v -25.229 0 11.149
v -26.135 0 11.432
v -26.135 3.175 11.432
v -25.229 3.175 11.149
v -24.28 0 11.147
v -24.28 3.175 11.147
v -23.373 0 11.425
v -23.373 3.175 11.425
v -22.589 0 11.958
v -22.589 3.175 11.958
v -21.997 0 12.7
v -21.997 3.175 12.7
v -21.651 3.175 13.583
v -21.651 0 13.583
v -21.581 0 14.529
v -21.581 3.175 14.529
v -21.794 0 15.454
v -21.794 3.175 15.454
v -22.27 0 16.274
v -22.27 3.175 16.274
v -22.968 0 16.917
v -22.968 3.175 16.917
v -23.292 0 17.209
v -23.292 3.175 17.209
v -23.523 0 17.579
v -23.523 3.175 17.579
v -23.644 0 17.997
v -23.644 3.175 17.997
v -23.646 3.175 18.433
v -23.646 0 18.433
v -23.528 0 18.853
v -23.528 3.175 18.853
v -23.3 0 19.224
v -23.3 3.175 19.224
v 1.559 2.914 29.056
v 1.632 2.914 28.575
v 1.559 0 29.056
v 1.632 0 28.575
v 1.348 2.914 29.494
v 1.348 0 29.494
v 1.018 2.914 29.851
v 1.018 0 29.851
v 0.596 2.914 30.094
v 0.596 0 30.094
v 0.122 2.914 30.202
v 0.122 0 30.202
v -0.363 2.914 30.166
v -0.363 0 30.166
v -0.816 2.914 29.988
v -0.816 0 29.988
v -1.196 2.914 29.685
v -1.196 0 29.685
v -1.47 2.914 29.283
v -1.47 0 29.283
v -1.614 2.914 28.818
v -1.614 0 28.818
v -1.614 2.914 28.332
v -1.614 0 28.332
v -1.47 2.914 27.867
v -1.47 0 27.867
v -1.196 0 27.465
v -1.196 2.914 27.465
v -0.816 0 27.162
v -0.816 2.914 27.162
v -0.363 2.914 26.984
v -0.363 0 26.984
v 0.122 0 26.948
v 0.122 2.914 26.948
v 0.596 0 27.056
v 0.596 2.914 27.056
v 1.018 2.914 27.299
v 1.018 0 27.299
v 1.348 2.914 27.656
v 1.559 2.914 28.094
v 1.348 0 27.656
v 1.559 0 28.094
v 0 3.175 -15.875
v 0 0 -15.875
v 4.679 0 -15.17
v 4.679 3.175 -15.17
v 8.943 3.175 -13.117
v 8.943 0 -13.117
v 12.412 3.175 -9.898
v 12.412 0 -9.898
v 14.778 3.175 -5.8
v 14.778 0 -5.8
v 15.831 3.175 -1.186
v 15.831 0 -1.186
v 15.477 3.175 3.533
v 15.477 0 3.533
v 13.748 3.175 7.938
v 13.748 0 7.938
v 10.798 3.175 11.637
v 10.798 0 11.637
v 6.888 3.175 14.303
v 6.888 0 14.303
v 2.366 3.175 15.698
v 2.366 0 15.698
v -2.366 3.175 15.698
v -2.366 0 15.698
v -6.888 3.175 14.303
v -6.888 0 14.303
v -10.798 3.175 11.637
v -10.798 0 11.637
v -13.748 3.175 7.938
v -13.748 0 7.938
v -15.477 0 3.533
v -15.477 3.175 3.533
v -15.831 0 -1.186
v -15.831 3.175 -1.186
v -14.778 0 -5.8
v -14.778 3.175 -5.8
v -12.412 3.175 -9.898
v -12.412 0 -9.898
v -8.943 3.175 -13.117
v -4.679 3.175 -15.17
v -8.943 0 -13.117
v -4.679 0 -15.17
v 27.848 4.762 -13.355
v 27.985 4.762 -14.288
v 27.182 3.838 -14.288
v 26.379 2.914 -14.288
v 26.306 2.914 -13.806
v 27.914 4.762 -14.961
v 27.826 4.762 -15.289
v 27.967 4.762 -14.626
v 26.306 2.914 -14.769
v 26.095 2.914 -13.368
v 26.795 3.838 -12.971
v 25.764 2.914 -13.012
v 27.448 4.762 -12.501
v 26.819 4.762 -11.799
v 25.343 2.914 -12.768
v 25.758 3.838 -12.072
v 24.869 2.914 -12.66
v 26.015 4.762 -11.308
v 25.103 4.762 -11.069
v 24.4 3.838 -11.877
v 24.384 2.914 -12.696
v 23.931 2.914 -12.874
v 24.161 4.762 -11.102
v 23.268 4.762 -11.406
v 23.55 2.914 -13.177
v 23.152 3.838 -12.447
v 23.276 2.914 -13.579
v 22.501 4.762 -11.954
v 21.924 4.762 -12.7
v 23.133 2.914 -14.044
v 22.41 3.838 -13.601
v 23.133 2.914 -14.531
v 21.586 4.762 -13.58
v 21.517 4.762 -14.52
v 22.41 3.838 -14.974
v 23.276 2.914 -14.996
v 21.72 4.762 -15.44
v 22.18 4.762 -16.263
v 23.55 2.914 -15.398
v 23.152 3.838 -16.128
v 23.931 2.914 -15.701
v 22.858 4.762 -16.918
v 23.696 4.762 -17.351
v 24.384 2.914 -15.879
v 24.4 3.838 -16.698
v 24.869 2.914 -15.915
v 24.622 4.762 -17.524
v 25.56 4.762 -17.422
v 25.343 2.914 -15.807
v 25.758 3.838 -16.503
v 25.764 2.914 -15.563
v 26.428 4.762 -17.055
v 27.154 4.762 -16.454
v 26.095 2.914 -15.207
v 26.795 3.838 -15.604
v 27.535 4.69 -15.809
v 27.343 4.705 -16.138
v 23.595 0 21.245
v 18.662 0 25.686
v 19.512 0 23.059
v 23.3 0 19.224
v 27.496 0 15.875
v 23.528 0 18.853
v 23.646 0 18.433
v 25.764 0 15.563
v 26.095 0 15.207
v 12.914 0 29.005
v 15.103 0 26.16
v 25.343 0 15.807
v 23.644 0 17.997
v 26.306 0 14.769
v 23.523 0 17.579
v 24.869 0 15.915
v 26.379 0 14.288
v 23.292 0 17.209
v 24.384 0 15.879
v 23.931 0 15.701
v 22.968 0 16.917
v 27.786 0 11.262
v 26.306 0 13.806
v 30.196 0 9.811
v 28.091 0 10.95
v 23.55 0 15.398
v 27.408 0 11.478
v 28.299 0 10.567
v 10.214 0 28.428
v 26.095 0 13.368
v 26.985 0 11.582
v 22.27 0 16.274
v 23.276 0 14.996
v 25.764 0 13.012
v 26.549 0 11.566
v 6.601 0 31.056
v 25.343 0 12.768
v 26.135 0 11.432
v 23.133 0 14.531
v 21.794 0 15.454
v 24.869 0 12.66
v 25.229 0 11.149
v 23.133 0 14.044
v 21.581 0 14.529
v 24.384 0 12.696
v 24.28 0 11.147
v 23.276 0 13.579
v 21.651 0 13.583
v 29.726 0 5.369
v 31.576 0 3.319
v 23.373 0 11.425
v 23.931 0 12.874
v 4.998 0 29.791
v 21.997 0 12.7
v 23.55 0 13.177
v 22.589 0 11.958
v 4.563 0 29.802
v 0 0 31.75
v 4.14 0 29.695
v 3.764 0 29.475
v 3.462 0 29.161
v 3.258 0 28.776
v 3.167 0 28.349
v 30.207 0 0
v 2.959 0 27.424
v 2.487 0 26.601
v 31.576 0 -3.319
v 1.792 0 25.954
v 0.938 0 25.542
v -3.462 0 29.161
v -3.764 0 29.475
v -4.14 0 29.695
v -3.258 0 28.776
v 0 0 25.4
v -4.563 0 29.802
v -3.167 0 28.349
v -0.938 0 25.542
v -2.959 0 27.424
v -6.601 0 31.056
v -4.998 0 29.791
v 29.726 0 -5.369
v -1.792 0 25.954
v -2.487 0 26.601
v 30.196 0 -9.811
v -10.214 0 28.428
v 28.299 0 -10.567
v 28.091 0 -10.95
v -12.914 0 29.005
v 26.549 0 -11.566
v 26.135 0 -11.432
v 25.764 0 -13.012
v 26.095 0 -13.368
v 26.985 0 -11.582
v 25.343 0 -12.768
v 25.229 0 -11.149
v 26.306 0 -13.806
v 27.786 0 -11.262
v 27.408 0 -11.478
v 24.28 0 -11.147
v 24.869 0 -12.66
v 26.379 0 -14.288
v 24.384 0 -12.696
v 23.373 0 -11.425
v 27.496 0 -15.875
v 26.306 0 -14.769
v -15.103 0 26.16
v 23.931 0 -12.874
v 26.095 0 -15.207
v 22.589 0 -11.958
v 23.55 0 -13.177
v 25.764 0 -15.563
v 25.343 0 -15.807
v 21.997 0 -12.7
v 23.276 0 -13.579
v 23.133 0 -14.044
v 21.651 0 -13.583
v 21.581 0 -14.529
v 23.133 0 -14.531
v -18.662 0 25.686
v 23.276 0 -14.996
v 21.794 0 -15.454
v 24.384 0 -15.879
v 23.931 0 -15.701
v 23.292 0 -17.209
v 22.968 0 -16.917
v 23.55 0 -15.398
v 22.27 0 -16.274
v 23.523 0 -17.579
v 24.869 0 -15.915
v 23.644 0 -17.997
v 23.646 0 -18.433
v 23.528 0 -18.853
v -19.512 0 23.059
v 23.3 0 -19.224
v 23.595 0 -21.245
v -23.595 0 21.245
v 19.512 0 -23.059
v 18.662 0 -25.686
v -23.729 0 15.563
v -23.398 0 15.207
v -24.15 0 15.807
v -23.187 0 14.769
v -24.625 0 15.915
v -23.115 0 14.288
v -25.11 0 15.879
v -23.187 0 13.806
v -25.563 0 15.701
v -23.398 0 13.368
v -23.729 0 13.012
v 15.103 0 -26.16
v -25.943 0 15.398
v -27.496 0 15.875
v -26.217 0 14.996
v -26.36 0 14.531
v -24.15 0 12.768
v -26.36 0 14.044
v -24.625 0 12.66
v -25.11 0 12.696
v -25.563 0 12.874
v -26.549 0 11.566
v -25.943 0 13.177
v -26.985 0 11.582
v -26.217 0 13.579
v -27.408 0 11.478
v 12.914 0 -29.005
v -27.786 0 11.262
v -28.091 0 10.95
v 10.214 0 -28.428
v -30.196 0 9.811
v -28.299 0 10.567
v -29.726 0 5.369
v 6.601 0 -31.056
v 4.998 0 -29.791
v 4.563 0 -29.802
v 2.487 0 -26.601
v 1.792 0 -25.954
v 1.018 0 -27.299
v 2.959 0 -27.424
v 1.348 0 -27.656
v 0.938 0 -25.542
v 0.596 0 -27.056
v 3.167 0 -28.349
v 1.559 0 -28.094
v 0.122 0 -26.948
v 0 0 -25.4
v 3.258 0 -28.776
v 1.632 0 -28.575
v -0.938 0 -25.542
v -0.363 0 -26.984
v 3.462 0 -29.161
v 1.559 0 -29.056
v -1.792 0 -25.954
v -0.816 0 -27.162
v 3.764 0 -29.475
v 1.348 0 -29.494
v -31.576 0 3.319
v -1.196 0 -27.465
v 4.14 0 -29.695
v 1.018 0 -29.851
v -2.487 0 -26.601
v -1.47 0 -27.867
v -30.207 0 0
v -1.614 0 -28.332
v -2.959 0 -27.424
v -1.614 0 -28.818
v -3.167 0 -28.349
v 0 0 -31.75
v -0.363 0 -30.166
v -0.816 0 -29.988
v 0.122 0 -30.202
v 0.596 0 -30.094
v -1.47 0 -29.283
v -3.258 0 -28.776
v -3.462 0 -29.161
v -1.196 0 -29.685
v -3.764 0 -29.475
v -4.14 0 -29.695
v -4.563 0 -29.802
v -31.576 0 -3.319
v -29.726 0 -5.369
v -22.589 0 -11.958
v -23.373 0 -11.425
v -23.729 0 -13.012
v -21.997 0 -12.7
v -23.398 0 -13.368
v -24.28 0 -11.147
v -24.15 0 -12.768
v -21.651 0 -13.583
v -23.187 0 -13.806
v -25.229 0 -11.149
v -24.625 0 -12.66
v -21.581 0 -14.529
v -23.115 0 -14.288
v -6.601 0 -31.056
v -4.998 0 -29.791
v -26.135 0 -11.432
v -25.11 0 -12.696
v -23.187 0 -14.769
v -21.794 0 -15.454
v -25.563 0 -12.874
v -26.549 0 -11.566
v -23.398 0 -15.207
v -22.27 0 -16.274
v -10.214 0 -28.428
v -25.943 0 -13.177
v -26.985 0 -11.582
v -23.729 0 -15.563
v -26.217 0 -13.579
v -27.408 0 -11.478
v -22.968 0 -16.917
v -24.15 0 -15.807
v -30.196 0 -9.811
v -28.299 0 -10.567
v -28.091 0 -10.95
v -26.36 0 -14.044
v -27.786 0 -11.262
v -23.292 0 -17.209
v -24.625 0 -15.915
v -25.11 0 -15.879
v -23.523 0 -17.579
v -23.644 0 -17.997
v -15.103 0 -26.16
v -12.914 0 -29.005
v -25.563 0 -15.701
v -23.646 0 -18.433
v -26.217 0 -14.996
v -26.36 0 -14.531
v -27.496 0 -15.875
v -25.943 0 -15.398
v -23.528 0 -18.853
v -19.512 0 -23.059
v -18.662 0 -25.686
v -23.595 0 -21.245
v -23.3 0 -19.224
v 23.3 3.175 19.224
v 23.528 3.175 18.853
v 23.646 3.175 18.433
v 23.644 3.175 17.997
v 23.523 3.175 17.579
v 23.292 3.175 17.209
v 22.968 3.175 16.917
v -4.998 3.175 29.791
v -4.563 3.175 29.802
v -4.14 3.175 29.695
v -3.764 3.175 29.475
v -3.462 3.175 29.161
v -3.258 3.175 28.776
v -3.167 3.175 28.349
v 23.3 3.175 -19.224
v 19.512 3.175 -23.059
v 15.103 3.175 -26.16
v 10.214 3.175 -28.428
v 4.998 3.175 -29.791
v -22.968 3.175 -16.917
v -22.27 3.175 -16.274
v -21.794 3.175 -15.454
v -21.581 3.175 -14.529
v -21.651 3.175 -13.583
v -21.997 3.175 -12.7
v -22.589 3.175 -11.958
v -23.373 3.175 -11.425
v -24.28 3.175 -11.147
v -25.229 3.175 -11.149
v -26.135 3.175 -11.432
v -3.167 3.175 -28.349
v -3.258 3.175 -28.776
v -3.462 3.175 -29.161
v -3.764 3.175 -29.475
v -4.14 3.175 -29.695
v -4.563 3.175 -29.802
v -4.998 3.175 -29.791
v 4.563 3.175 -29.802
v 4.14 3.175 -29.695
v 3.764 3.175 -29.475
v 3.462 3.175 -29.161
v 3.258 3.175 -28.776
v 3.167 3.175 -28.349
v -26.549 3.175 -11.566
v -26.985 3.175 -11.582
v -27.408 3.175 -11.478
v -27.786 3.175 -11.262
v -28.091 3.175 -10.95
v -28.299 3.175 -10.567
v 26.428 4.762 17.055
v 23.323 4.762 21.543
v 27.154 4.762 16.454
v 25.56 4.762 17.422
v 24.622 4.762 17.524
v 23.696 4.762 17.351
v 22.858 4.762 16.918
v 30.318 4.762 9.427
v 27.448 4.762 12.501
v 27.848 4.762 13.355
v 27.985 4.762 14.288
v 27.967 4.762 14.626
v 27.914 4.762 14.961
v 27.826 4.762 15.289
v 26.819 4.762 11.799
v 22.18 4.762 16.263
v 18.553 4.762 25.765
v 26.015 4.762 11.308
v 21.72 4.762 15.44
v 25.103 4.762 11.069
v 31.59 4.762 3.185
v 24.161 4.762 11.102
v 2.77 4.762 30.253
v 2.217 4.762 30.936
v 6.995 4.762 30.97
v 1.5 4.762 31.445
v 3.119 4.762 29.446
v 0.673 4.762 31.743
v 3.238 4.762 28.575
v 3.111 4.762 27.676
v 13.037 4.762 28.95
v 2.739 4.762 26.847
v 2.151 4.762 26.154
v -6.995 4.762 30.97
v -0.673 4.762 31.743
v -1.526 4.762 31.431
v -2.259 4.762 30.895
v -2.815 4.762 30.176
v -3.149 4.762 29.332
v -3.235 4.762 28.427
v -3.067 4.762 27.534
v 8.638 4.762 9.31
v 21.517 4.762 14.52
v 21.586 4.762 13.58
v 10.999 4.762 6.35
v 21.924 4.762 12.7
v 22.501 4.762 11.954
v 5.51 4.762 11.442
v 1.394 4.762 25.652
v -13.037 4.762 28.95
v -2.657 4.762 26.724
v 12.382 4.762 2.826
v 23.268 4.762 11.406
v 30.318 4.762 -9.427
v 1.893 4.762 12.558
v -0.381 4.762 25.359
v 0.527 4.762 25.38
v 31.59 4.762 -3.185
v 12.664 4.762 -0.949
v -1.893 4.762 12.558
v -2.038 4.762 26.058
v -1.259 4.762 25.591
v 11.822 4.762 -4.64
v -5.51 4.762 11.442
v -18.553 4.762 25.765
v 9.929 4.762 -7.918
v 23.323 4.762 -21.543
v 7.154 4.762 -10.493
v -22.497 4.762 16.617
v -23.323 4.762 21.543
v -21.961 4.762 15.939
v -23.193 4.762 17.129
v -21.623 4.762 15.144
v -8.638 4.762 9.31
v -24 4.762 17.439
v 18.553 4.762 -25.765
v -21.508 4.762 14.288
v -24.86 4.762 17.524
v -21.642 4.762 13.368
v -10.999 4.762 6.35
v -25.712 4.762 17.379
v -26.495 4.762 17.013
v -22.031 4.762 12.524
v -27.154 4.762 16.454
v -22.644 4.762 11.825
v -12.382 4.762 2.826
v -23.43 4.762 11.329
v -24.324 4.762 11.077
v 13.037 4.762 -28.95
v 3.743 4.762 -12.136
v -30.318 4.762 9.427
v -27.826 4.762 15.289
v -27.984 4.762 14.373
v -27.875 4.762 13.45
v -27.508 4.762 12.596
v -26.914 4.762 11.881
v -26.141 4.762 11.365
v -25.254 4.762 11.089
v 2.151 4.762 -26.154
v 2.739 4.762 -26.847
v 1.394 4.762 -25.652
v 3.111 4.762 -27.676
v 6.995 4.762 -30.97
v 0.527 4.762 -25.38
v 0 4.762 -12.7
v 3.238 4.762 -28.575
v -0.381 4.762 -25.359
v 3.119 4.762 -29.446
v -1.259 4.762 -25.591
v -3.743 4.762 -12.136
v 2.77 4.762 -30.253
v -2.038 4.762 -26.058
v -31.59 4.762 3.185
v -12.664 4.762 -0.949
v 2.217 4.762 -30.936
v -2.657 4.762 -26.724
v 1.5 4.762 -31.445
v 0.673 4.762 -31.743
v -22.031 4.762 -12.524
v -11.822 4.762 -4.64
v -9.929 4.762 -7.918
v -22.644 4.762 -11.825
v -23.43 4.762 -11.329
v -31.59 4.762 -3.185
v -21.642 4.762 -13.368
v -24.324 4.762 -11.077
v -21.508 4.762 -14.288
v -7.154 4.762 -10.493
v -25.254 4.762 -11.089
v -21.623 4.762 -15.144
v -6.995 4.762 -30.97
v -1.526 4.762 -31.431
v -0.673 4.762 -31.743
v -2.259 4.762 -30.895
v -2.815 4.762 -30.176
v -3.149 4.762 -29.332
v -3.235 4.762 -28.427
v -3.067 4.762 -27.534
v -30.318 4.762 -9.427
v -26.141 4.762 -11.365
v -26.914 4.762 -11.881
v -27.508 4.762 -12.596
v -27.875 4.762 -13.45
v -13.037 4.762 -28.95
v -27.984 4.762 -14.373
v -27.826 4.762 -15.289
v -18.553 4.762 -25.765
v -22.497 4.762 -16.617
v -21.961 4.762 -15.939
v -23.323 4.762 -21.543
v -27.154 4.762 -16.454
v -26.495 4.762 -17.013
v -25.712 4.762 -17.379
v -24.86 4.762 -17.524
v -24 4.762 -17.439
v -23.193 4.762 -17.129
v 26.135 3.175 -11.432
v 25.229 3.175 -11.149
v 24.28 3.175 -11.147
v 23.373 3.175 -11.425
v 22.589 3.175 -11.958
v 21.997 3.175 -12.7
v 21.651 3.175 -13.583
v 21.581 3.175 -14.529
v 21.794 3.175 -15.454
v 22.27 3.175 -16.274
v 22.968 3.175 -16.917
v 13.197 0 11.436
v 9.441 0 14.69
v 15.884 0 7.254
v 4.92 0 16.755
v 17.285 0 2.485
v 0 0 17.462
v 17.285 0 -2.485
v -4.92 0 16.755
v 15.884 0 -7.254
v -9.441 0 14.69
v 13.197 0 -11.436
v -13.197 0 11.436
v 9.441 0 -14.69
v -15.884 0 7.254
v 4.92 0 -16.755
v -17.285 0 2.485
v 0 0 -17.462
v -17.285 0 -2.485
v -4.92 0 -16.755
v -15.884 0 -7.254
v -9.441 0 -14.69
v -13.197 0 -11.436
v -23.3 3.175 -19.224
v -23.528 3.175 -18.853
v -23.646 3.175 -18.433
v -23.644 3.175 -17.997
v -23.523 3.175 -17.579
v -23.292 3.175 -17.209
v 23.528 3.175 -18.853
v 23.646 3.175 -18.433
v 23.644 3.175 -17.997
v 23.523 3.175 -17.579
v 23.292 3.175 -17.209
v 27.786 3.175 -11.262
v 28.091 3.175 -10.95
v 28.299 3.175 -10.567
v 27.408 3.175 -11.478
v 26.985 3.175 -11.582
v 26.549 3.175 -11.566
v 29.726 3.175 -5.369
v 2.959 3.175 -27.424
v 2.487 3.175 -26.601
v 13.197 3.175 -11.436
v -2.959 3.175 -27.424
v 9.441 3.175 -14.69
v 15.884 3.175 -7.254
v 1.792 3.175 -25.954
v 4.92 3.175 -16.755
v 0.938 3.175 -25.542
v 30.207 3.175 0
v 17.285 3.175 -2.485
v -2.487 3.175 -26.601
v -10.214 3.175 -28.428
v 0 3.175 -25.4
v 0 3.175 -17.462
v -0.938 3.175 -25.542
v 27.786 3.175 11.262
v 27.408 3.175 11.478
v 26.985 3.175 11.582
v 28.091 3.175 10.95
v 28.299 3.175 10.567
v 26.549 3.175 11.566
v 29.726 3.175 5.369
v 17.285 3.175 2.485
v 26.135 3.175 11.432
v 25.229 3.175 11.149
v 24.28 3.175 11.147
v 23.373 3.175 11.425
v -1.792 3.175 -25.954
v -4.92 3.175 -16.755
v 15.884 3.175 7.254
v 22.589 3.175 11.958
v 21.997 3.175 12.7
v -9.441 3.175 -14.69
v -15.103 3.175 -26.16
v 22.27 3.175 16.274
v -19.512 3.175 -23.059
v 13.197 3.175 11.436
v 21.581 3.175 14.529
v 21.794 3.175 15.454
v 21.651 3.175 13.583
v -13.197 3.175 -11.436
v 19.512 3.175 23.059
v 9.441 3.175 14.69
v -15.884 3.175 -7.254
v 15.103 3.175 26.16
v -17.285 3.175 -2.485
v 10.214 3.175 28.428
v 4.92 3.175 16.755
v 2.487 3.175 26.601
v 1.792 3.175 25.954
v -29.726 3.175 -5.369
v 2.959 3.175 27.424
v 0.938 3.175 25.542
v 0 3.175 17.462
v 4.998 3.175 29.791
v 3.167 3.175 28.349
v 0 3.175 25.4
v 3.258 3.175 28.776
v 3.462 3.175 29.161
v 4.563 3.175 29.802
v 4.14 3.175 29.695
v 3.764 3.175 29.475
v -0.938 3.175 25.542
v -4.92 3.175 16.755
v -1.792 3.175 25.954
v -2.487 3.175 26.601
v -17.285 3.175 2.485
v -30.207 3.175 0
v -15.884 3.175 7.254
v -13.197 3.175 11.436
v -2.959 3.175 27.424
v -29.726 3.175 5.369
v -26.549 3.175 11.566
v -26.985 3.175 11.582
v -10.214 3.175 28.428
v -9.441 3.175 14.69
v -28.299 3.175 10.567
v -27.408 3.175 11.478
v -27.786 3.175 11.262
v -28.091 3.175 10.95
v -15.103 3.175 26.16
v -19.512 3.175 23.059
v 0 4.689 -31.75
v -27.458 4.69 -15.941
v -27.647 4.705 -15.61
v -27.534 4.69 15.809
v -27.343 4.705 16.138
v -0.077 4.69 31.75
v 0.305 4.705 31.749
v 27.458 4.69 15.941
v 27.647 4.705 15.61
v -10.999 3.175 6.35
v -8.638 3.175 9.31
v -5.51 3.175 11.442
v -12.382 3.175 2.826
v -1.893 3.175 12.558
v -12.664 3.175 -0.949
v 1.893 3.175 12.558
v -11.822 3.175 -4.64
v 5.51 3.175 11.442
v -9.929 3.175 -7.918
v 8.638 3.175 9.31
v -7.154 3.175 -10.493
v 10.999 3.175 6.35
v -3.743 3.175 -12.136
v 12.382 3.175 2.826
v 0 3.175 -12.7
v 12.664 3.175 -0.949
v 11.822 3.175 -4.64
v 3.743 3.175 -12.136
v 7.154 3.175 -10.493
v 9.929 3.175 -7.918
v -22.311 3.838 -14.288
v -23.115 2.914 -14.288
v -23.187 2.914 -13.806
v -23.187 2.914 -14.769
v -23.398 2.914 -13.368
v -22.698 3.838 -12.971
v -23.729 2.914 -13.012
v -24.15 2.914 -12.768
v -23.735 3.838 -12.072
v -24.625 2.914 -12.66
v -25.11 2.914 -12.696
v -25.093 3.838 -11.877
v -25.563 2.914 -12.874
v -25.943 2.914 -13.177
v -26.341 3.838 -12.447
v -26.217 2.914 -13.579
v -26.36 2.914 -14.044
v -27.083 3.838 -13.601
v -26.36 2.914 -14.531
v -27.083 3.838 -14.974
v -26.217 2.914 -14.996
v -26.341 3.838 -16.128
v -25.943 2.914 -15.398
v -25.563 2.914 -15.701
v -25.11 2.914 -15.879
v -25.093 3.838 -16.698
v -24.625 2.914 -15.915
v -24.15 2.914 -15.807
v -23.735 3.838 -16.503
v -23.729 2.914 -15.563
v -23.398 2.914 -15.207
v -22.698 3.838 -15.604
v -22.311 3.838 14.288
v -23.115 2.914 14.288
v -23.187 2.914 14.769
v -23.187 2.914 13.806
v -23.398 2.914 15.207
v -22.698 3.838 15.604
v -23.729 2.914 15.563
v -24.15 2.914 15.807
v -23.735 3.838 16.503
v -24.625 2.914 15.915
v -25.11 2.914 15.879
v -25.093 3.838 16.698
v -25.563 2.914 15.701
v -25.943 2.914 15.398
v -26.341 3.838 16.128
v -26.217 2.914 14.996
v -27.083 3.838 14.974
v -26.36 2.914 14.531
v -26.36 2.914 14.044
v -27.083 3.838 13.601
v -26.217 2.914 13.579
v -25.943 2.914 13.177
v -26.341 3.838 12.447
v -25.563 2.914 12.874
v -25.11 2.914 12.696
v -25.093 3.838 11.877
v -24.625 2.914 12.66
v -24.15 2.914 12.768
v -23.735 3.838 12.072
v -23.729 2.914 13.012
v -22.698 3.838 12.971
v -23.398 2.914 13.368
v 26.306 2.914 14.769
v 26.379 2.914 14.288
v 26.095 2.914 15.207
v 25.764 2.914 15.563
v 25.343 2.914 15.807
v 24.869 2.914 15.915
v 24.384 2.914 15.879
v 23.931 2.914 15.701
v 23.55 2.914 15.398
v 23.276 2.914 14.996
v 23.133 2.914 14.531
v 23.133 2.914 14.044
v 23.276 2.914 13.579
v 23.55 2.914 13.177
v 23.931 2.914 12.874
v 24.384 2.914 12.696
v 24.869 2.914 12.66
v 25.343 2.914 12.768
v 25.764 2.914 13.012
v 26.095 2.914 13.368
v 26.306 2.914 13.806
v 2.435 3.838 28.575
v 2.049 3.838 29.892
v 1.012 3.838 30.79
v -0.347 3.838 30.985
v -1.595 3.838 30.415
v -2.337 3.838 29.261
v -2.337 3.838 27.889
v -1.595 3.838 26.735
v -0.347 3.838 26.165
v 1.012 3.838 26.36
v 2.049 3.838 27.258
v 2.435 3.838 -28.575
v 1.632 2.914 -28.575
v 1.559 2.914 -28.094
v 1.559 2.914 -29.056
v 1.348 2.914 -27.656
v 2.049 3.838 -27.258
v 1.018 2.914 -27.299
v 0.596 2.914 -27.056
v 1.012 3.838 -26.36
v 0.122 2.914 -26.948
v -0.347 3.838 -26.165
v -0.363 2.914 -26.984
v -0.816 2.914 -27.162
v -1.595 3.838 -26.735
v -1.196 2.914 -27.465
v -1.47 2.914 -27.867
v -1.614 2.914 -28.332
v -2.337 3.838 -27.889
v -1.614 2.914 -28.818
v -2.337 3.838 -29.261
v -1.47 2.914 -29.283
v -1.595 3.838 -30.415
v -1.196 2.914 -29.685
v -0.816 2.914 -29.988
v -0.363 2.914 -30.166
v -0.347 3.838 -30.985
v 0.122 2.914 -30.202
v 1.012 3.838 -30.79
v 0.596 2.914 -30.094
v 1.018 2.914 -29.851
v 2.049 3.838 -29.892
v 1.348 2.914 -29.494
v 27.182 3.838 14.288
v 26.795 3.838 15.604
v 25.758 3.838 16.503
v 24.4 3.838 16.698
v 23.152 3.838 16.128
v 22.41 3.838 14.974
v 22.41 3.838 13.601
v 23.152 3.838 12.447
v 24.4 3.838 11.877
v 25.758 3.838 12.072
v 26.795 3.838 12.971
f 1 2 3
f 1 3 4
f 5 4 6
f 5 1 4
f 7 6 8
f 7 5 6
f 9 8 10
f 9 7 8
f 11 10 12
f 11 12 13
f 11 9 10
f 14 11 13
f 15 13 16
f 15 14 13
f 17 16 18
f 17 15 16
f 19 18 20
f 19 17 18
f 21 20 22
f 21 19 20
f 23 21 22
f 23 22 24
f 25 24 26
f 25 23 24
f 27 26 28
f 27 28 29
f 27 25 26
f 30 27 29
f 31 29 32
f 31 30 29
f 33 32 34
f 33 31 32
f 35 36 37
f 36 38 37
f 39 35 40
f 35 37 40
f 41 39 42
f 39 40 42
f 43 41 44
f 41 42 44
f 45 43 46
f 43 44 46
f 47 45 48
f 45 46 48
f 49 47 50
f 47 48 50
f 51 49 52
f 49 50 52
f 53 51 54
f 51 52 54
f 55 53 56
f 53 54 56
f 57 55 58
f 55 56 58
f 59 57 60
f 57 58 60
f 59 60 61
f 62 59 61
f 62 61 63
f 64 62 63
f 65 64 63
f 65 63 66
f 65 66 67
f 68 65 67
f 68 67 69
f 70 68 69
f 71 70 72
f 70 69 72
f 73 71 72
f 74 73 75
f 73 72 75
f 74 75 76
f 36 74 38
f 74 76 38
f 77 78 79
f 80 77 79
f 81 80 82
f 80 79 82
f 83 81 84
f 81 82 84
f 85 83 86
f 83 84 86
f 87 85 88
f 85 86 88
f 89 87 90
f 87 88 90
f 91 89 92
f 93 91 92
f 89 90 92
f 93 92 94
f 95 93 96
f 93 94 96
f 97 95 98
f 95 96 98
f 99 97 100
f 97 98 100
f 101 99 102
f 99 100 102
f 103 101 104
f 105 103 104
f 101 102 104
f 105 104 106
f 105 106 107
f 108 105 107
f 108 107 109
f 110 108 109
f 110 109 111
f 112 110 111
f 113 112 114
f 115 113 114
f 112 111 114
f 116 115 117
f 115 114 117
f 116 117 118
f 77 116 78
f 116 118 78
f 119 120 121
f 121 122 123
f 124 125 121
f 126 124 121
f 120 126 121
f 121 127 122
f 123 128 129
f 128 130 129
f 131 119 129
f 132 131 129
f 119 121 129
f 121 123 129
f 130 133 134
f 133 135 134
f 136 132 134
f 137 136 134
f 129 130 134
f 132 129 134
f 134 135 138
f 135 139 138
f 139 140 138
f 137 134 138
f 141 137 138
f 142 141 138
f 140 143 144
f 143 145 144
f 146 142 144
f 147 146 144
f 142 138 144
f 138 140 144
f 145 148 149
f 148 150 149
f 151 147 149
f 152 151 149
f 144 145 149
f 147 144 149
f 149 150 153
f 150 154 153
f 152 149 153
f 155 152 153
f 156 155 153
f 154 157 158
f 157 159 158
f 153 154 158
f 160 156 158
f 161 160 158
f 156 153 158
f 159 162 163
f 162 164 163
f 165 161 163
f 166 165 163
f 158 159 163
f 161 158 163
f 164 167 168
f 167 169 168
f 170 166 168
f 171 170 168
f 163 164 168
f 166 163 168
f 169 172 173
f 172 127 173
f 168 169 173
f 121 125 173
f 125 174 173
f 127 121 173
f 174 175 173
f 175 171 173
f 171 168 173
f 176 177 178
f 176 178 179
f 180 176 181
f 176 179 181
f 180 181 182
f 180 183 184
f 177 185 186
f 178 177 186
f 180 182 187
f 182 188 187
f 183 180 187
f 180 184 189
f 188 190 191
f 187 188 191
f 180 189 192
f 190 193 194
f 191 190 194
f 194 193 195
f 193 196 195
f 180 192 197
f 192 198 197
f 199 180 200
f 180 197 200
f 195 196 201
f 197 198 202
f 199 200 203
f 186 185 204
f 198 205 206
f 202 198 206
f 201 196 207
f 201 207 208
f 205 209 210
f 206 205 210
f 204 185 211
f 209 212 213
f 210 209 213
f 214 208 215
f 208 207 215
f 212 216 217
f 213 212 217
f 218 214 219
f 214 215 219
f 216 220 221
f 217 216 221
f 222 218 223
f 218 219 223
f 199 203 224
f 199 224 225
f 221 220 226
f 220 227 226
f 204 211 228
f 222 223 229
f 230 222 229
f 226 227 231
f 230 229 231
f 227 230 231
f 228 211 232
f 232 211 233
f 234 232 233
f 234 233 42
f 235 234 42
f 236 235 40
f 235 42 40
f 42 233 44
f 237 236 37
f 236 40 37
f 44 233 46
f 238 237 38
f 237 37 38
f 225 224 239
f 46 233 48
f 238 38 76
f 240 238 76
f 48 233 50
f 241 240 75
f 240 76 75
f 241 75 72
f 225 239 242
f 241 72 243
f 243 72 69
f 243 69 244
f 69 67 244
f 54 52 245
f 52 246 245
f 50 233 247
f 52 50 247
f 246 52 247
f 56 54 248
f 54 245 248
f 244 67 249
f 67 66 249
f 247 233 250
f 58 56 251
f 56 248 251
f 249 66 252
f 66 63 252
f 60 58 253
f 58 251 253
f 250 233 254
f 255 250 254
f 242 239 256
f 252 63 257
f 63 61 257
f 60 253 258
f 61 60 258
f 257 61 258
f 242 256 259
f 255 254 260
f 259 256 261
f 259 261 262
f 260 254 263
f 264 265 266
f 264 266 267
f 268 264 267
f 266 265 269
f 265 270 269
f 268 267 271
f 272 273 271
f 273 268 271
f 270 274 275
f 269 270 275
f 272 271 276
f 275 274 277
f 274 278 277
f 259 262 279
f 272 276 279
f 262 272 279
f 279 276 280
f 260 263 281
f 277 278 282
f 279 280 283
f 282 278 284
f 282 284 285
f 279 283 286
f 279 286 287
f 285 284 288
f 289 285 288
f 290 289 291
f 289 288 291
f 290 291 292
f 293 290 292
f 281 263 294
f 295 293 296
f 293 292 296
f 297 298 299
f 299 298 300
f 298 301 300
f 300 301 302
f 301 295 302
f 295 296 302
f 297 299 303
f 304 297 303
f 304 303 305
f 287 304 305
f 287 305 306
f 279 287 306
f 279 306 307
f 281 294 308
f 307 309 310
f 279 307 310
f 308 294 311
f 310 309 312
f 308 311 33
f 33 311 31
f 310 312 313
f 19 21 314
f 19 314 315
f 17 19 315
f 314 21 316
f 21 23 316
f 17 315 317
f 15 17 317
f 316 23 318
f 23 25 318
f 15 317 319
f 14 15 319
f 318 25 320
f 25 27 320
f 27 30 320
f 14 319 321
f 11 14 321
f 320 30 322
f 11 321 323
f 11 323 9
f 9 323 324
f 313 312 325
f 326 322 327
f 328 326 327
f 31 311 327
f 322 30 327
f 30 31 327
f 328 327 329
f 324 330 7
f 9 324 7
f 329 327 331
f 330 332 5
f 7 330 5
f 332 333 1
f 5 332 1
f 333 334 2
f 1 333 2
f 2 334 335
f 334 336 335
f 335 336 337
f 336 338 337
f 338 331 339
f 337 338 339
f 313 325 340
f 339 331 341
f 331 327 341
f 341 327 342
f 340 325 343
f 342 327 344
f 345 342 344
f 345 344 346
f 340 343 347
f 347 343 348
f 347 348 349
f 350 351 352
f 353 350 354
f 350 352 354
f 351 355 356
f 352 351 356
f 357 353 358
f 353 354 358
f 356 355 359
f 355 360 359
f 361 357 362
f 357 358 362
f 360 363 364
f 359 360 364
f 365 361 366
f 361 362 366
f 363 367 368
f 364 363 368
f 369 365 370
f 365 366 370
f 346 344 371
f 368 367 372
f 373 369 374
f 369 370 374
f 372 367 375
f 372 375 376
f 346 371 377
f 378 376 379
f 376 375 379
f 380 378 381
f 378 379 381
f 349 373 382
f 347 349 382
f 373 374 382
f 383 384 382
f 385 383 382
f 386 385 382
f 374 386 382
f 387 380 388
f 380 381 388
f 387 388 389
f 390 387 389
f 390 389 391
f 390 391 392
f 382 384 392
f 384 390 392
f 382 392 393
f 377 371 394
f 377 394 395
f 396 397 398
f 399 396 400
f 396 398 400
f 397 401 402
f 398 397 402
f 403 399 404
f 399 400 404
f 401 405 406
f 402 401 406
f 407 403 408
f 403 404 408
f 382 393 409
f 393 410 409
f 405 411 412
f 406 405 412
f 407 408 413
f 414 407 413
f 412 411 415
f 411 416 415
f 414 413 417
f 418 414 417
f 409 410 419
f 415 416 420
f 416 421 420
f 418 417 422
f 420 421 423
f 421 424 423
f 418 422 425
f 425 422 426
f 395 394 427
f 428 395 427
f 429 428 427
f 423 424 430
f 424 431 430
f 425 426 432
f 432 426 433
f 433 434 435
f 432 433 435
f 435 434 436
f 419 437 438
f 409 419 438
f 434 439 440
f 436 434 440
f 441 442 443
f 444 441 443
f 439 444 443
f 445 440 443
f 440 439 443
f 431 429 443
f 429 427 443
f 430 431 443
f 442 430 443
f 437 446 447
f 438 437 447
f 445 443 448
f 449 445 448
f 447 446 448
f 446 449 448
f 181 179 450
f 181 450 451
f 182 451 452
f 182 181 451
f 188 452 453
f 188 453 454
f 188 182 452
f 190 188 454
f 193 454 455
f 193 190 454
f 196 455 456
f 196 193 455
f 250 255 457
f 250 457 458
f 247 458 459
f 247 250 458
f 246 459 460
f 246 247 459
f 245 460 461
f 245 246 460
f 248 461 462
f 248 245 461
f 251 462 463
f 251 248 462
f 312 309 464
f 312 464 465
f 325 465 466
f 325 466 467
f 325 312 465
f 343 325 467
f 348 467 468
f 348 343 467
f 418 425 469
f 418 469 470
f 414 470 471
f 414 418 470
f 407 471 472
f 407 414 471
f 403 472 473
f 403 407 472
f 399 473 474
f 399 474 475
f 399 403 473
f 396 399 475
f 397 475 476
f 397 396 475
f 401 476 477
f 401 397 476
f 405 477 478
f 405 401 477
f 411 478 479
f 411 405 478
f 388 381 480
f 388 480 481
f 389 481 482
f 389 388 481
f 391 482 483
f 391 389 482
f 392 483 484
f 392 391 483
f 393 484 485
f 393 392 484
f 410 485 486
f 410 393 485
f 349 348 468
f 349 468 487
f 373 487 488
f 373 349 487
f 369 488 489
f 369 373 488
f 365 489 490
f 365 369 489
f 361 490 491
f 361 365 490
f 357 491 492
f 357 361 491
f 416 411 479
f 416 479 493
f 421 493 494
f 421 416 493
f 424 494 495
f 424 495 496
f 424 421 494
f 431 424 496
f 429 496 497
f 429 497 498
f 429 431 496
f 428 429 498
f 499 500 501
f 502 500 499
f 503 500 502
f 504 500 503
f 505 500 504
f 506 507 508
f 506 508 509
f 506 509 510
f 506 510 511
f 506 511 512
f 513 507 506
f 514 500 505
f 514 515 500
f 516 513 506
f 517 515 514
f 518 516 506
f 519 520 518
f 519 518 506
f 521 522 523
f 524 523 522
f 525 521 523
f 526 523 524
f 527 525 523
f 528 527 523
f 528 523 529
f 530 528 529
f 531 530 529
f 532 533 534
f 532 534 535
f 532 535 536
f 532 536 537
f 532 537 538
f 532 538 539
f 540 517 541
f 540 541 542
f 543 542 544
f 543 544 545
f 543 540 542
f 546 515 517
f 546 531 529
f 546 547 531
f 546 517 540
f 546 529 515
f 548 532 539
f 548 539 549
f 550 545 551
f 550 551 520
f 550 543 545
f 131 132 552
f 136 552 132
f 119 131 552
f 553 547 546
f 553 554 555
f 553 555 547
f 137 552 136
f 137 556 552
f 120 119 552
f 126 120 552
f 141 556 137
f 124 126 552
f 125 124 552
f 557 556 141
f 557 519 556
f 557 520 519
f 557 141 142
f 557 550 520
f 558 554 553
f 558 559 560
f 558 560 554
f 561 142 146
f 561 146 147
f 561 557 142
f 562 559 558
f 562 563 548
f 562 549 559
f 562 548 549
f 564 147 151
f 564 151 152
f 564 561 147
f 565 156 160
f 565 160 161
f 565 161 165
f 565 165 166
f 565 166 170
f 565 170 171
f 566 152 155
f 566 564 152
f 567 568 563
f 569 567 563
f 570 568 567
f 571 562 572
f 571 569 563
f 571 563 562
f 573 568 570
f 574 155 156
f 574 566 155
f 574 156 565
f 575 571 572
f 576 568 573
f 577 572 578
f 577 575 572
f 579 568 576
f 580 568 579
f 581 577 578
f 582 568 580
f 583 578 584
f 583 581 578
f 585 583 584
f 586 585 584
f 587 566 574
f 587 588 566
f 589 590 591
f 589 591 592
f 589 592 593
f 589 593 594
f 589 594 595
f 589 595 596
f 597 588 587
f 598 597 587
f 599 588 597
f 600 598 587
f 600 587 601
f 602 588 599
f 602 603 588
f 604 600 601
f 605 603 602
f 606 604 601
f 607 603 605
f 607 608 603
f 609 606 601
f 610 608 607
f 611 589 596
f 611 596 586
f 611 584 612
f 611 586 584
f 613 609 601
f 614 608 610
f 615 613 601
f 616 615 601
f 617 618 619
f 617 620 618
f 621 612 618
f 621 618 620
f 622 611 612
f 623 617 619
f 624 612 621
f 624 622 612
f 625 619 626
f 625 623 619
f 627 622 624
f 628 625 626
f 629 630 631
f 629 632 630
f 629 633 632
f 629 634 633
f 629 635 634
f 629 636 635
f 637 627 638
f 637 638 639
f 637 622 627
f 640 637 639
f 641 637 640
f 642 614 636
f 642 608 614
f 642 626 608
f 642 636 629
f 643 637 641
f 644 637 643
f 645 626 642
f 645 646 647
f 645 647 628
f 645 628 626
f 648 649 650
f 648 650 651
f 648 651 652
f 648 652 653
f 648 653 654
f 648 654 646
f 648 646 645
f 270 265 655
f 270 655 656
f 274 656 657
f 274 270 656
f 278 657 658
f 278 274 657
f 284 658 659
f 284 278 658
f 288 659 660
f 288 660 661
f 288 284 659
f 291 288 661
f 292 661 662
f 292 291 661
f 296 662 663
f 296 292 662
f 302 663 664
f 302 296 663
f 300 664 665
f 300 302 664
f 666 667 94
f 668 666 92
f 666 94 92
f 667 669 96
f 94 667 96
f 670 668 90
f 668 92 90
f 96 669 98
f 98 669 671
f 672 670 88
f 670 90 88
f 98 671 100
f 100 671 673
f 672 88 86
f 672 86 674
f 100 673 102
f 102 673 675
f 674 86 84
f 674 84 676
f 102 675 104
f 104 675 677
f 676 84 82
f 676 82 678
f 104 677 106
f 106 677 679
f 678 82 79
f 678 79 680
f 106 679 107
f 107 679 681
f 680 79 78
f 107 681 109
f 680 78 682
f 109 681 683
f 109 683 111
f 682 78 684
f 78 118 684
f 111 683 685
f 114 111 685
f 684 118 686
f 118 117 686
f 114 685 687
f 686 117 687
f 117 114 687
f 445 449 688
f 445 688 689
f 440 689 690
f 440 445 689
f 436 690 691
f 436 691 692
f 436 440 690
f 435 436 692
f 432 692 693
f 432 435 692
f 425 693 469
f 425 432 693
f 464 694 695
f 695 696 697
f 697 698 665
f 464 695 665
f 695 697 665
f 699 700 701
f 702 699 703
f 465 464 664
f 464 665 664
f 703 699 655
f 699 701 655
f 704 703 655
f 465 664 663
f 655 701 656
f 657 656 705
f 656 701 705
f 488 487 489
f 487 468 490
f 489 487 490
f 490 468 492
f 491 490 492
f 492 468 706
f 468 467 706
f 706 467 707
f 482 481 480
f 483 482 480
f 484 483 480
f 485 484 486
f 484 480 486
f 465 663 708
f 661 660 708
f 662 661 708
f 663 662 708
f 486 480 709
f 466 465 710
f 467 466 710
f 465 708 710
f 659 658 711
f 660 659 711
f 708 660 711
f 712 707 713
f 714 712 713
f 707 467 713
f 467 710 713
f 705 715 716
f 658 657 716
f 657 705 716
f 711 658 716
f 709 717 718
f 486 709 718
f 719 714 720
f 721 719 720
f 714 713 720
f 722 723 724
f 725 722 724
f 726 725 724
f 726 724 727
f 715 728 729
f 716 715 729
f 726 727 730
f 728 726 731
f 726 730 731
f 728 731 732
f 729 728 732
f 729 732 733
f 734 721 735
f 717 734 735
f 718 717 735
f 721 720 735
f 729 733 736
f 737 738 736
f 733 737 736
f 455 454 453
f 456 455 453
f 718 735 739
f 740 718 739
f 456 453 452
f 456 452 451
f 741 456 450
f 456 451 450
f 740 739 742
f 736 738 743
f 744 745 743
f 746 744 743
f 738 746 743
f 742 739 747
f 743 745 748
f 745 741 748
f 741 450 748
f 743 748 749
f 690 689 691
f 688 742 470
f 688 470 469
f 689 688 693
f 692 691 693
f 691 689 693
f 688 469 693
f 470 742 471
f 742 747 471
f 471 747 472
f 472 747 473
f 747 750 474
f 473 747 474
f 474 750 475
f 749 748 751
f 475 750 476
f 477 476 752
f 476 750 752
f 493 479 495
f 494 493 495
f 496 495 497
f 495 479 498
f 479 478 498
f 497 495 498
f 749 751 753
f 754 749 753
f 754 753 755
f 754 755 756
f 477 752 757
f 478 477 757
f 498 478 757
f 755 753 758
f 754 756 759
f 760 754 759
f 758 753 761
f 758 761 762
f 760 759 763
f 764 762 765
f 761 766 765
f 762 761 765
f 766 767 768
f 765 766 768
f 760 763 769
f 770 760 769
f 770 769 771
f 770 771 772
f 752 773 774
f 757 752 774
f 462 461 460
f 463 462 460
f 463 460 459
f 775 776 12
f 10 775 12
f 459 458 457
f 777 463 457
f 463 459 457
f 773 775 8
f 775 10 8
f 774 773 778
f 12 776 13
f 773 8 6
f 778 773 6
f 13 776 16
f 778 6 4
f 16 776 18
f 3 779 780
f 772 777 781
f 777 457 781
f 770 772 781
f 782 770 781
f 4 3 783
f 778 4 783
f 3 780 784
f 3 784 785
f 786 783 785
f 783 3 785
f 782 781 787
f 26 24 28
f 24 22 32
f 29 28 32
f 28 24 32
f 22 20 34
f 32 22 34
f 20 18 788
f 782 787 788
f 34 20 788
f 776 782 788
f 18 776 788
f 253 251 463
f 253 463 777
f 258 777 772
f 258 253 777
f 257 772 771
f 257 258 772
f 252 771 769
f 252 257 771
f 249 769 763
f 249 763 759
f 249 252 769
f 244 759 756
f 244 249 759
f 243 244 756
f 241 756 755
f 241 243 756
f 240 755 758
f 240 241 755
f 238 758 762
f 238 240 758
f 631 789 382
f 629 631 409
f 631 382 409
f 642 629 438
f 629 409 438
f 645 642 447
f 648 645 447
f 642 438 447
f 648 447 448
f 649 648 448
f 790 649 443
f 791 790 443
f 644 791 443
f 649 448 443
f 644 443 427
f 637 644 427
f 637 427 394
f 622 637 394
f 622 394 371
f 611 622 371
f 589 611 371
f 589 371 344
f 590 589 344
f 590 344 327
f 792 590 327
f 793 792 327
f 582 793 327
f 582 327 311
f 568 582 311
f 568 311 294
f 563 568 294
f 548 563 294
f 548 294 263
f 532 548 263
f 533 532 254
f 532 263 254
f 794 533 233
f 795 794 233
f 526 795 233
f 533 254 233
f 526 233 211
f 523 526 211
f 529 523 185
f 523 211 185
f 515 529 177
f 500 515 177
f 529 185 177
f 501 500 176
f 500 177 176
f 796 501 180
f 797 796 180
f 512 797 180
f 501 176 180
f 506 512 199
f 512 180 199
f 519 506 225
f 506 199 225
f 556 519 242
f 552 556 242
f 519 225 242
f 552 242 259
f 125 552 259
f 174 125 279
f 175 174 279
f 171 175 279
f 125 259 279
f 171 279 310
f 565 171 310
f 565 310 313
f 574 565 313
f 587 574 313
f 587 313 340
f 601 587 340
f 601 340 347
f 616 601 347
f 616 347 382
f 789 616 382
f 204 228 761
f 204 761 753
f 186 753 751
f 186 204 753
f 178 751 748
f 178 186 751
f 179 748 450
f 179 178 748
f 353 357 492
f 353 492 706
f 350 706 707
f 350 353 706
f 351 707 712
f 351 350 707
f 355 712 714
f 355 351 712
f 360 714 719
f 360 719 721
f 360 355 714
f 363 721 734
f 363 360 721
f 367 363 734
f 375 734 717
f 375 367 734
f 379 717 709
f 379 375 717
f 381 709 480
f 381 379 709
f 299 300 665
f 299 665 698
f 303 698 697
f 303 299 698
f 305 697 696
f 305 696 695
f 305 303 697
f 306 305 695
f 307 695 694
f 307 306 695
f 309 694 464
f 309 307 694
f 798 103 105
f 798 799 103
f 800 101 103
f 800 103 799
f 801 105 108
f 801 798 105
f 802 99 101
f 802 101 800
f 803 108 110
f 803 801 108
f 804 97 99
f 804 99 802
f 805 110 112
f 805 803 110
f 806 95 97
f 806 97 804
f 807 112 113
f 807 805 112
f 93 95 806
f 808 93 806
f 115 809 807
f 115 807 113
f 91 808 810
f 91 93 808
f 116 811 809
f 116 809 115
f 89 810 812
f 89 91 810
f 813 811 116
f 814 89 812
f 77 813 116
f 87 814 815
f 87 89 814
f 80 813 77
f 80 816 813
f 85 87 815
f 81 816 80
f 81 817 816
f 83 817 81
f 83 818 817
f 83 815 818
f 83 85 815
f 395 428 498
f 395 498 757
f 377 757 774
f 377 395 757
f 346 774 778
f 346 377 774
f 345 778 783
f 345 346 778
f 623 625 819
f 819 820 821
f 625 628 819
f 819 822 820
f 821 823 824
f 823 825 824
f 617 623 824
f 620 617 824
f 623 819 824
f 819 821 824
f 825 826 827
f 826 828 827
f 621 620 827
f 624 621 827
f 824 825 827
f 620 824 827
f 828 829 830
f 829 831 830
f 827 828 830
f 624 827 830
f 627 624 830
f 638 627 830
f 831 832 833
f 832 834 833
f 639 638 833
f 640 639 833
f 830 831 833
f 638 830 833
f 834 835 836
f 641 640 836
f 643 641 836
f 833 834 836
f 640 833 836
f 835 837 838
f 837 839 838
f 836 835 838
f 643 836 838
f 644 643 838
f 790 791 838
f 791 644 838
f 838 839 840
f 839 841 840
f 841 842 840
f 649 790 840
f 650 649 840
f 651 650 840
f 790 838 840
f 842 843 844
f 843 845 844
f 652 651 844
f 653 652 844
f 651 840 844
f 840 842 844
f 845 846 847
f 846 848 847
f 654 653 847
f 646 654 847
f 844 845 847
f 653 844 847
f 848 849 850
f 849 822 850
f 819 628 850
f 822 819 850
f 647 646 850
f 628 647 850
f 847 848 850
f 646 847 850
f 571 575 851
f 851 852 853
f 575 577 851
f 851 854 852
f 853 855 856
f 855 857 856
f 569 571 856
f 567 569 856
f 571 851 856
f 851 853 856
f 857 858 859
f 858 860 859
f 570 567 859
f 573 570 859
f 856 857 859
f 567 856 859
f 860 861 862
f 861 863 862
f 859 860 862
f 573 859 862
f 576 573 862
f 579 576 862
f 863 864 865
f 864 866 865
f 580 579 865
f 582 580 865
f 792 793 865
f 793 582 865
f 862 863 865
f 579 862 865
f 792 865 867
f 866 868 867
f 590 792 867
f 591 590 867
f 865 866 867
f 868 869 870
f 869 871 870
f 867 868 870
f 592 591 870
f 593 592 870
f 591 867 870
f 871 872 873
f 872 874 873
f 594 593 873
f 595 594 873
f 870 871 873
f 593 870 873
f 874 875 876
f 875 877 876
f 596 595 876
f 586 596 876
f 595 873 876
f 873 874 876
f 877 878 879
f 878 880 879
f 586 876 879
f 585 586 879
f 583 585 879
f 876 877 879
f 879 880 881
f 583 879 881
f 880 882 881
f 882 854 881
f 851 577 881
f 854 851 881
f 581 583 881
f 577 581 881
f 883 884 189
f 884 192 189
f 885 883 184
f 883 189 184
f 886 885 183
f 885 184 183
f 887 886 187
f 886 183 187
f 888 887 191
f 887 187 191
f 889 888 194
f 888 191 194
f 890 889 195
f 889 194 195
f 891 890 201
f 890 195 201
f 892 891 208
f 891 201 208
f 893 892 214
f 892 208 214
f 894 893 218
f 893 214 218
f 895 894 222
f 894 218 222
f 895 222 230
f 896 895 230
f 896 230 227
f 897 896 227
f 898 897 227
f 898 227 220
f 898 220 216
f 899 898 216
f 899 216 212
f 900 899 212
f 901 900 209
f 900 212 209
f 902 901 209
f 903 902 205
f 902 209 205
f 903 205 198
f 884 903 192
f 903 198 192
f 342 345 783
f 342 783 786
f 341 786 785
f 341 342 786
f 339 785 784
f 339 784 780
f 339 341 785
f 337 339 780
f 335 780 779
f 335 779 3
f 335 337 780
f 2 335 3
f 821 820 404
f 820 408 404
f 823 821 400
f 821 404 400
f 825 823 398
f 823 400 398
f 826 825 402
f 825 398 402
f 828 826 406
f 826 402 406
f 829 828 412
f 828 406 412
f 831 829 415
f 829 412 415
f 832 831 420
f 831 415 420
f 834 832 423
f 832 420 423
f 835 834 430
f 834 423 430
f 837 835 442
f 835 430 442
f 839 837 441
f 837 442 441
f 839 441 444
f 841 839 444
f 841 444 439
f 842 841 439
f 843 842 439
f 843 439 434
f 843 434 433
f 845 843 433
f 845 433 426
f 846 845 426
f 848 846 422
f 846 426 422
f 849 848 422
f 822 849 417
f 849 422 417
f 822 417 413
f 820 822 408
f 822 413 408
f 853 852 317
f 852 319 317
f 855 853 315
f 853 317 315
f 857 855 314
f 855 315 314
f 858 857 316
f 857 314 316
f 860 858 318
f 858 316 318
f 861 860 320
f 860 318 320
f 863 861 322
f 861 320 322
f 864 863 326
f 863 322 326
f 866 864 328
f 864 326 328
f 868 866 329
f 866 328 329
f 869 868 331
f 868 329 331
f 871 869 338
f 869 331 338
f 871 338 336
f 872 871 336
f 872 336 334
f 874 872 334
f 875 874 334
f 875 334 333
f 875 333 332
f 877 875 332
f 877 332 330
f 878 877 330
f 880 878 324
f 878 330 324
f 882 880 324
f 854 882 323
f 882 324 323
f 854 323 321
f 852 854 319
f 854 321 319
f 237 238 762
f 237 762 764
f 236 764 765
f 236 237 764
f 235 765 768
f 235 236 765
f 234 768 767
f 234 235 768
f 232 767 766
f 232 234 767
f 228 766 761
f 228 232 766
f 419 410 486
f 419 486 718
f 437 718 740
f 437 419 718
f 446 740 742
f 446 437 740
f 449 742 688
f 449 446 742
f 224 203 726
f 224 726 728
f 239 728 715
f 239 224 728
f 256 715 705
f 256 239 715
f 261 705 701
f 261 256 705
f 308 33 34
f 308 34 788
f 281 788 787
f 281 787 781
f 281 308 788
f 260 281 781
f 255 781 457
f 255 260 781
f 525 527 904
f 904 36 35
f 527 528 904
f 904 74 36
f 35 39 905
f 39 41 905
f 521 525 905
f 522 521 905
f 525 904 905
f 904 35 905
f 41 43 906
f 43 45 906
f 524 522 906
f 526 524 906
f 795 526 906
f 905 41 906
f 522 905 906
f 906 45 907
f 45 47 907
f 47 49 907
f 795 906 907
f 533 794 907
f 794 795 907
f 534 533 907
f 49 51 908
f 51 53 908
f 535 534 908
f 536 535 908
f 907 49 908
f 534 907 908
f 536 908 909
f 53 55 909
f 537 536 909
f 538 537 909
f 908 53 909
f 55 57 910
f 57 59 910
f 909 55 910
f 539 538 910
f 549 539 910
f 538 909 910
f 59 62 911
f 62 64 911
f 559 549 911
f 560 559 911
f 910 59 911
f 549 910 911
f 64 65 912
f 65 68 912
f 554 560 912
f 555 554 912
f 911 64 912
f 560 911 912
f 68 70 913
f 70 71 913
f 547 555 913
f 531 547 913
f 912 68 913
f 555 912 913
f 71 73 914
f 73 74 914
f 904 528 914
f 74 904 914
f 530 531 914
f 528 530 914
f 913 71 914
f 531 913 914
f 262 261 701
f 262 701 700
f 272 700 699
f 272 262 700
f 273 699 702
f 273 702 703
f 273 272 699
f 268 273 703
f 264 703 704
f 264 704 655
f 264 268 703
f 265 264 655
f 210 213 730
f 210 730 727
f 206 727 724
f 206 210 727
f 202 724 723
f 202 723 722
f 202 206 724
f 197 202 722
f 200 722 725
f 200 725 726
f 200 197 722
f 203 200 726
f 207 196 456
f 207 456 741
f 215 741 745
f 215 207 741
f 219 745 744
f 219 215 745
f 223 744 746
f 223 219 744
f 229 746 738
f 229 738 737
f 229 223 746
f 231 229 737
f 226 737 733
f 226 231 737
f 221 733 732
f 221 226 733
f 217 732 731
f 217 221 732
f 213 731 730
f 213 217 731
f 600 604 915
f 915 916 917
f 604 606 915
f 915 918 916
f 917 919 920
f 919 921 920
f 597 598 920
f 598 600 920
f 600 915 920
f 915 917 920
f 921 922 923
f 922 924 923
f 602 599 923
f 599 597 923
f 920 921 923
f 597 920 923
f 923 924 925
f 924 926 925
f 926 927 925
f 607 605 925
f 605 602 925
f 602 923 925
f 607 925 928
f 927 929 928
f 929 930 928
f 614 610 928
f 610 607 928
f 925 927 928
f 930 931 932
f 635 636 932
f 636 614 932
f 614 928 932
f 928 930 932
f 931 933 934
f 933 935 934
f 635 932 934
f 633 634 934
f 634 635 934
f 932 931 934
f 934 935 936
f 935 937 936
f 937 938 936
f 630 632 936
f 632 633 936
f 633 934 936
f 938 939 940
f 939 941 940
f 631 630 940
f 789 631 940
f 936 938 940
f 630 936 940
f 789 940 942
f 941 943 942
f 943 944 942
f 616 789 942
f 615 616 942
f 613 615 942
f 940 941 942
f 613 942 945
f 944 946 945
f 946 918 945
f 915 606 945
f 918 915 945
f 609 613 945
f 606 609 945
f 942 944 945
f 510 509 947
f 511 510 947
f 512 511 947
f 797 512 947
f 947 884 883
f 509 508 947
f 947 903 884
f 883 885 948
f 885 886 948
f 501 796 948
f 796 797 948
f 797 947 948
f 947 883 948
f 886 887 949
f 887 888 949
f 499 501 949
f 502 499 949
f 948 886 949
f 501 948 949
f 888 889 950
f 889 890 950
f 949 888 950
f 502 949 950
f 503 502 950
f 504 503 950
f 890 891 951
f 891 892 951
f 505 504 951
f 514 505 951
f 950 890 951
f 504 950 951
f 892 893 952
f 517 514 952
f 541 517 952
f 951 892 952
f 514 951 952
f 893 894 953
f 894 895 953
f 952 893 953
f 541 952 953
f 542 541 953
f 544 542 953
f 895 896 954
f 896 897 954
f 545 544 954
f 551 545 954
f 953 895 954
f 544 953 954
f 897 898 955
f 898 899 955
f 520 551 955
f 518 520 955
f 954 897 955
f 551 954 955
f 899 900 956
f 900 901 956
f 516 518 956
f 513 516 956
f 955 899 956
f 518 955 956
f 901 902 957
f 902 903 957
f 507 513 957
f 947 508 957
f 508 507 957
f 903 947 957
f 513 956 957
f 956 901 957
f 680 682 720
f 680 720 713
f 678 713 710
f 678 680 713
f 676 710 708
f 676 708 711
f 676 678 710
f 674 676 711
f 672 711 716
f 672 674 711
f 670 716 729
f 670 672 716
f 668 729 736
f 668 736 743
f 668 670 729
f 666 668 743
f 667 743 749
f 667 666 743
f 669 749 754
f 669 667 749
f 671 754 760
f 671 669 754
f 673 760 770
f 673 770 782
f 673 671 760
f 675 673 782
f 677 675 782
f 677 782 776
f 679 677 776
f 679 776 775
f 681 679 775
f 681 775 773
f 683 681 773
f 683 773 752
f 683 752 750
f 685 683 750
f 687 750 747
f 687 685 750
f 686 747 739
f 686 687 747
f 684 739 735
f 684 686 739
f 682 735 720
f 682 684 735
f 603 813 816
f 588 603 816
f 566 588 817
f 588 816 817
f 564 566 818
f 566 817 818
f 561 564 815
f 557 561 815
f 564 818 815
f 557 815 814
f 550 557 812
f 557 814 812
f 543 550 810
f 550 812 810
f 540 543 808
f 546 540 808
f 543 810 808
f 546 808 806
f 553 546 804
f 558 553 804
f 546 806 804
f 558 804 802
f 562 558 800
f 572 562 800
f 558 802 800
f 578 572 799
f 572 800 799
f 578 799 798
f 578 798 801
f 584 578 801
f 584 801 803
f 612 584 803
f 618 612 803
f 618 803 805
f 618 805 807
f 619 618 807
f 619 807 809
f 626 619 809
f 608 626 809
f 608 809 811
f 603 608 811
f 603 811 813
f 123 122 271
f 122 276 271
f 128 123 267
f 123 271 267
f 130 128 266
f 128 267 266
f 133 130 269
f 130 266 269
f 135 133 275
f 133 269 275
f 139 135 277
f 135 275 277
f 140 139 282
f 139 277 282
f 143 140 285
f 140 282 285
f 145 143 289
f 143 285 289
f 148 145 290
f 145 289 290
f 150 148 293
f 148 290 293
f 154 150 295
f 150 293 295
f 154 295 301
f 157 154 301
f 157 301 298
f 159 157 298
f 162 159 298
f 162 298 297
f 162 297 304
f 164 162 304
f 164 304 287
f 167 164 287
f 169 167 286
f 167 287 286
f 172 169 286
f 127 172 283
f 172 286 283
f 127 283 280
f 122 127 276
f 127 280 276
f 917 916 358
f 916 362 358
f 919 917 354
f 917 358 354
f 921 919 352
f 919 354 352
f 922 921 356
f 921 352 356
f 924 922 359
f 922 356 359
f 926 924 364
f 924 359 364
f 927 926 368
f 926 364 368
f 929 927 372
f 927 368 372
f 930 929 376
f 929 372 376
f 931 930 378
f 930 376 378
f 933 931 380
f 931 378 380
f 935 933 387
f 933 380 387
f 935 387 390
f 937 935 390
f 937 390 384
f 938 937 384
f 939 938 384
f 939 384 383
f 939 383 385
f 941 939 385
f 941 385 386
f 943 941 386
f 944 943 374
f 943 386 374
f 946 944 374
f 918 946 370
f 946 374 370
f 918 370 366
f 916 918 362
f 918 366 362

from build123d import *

# Parameters (mm, degrees)
SKETCH1_R                                         = 31.75
BOSS_EXTRUDE1_DEPTH                               = 4.7625
CSK_FOR_4_FLAT_HEAD_SOCKET_CAP_SCREW1_D           = 3.2639
CSK_FOR_4_FLAT_HEAD_SOCKET_CAP_SCREW1_CSINK_D     = 6.477
CSK_FOR_4_FLAT_HEAD_SOCKET_CAP_SCREW1_CSINK_ANGLE = 82
SKETCH6_R                                         = 15.875
CUT_EXTRUDE1_DEPTH                                = 3.175
SKETCH7_R                                         = 12.7
CUT_EXTRUDE2_DEPTH                                = 3.175
SKETCH8_R                                         = 17.4625
CUT_EXTRUDE3_DEPTH                                = 3.175


with BuildPart() as part:
    # Sketch1 → Boss-Extrude1 (new body)
    with BuildSketch(Plane(origin=(0, 0, 0), x_dir=(1, 0, 0), z_dir=(0, 1, 0))):
        with Locations(Location((0, 0, 0), (0, 0, 90))):
            Circle(SKETCH1_R)
    extrude(amount=BOSS_EXTRUDE1_DEPTH)

    # CSK for #4 Flat Head Socket Cap Screw1 (through all)
    with Locations(Plane(origin=(0, 4.7625, 0), x_dir=(-1, 0, 0), z_dir=(0, 1, 0))):
        with Locations((0, 28.575), (24.746675913, 14.2875), (24.746675913, -14.2875), (0, -28.575), (-24.746675913, -14.2875), (-24.746675913, 14.2875)):
            CounterSinkHole(CSK_FOR_4_FLAT_HEAD_SOCKET_CAP_SCREW1_D / 2, CSK_FOR_4_FLAT_HEAD_SOCKET_CAP_SCREW1_CSINK_D / 2, counter_sink_angle=CSK_FOR_4_FLAT_HEAD_SOCKET_CAP_SCREW1_CSINK_ANGLE)

    # Sketch6 → Cut-Extrude1 (cut)
    with BuildSketch(Plane.XZ):
        with Locations(Location((0, 0, 0), (0, 0, 270))):
            Circle(SKETCH6_R)
    extrude(amount=-CUT_EXTRUDE1_DEPTH, mode=Mode.SUBTRACT)

    # Sketch7 → Cut-Extrude2 (cut)
    with BuildSketch(Plane.XZ.offset(-3.175)):
        with Locations(Location((0, 0, 0), (0, 0, 270))):
            Circle(SKETCH7_R)
    extrude(amount=-CUT_EXTRUDE2_DEPTH, mode=Mode.SUBTRACT)

    # Sketch8 → Cut-Extrude3 (cut)
    with BuildSketch(Plane.XZ):
        with BuildLine():
            ThreePointArc((26.134754006, 11.432002809), (27.408069158, 11.477856343), (28.298548725, 10.5665495))
            ThreePointArc((28.298548725, 10.5665495), (30.20695, 0), (28.298548725, -10.5665495))
            ThreePointArc((28.298548725, -10.5665495), (27.408069158, -11.477856343), (26.134754006, -11.432002809))
            ThreePointArc((26.134754006, -11.432002809), (21.997045256, -12.7), (22.967781852, -16.917359487))
            ThreePointArc((22.967781852, -16.917359487), (23.644149753, -17.997155988), (23.30017466, -19.223987337))
            ThreePointArc((23.30017466, -19.223987337), (15.103475, -26.159986071), (4.998374065, -29.790536836))
            ThreePointArc((4.998374065, -29.790536836), (3.763919405, -29.475012331), (3.166972154, -28.349362296))
            ThreePointArc((3.166972154, -28.349362296), (0, -25.4), (-3.166972154, -28.349362296))
            ThreePointArc((-3.166972154, -28.349362296), (-3.763919405, -29.475012331), (-4.998374065, -29.790536836))
            ThreePointArc((-4.998374065, -29.790536836), (-15.103475, -26.159986071), (-23.30017466, -19.223987337))
            ThreePointArc((-23.30017466, -19.223987337), (-23.644149753, -17.997155988), (-22.967781852, -16.917359487))
            ThreePointArc((-22.967781852, -16.917359487), (-21.997045256, -12.7), (-26.134754006, -11.432002809))
            ThreePointArc((-26.134754006, -11.432002809), (-27.408069158, -11.477856343), (-28.298548725, -10.5665495))
            ThreePointArc((-28.298548725, -10.5665495), (-30.20695, 0), (-28.298548725, 10.5665495))
            ThreePointArc((-28.298548725, 10.5665495), (-27.408069158, 11.477856343), (-26.134754006, 11.432002809))
            ThreePointArc((-26.134754006, 11.432002809), (-21.997045256, 12.7), (-22.967781852, 16.917359487))
            ThreePointArc((-22.967781852, 16.917359487), (-23.644149753, 17.997155988), (-23.30017466, 19.223987337))
            ThreePointArc((-23.30017466, 19.223987337), (-15.103475, 26.159986071), (-4.998374065, 29.790536836))
            ThreePointArc((-4.998374065, 29.790536836), (-3.763919405, 29.475012331), (-3.166972154, 28.349362296))
            ThreePointArc((-3.166972154, 28.349362296), (0, 25.4), (3.166972154, 28.349362296))
            ThreePointArc((3.166972154, 28.349362296), (3.763919405, 29.475012331), (4.998374065, 29.790536836))
            ThreePointArc((4.998374065, 29.790536836), (15.103475, 26.159986071), (23.30017466, 19.223987337))
            ThreePointArc((23.30017466, 19.223987337), (23.644149753, 17.997155988), (22.967781852, 16.917359487))
            ThreePointArc((22.967781852, 16.917359487), (21.997045256, 12.7), (26.134754006, 11.432002809))
        make_face()
        with Locations(Location((0, 0, 0), (0, 0, 270))):
            Circle(SKETCH8_R, mode=Mode.SUBTRACT)
    extrude(amount=-CUT_EXTRUDE3_DEPTH, mode=Mode.SUBTRACT)


solid = part.part
